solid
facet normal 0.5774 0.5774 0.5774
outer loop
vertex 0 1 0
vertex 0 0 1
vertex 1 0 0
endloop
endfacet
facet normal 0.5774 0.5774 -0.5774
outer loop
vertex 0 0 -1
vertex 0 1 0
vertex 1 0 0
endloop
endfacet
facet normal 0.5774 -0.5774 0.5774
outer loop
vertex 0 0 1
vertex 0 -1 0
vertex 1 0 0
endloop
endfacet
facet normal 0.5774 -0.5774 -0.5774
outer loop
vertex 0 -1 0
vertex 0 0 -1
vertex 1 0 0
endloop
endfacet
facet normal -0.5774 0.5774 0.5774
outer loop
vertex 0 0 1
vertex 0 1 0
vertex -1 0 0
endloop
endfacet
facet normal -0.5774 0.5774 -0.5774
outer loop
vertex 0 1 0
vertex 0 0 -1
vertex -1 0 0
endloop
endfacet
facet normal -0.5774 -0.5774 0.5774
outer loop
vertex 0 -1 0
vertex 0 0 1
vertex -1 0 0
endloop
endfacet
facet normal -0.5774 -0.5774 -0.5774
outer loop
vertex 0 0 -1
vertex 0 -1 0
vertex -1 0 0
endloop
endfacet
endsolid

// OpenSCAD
polyhedron(points = [
 [1,0,0], [0,0,1], [0,1,0],
 [1,0,0], [0,1,0], [0,0,-1],
 [1,0,0], [0,-1,0], [0,0,1],
 [1,0,0], [0,0,-1], [0,-1,0],
 [-1,0,0], [0,1,0], [0,0,1],
 [-1,0,0], [0,0,-1], [0,1,0],
 [-1,0,0], [0,0,1], [0,-1,0],
 [-1,0,0], [0,-1,0], [0,0,-1],
],
faces = [
 [0,1,2],
 [3,4,5],
 [6,7,8],
 [9,10,11],
 [12,13,14],
 [15,16,17],
 [18,19,20],
 [21,22,23]
]);
